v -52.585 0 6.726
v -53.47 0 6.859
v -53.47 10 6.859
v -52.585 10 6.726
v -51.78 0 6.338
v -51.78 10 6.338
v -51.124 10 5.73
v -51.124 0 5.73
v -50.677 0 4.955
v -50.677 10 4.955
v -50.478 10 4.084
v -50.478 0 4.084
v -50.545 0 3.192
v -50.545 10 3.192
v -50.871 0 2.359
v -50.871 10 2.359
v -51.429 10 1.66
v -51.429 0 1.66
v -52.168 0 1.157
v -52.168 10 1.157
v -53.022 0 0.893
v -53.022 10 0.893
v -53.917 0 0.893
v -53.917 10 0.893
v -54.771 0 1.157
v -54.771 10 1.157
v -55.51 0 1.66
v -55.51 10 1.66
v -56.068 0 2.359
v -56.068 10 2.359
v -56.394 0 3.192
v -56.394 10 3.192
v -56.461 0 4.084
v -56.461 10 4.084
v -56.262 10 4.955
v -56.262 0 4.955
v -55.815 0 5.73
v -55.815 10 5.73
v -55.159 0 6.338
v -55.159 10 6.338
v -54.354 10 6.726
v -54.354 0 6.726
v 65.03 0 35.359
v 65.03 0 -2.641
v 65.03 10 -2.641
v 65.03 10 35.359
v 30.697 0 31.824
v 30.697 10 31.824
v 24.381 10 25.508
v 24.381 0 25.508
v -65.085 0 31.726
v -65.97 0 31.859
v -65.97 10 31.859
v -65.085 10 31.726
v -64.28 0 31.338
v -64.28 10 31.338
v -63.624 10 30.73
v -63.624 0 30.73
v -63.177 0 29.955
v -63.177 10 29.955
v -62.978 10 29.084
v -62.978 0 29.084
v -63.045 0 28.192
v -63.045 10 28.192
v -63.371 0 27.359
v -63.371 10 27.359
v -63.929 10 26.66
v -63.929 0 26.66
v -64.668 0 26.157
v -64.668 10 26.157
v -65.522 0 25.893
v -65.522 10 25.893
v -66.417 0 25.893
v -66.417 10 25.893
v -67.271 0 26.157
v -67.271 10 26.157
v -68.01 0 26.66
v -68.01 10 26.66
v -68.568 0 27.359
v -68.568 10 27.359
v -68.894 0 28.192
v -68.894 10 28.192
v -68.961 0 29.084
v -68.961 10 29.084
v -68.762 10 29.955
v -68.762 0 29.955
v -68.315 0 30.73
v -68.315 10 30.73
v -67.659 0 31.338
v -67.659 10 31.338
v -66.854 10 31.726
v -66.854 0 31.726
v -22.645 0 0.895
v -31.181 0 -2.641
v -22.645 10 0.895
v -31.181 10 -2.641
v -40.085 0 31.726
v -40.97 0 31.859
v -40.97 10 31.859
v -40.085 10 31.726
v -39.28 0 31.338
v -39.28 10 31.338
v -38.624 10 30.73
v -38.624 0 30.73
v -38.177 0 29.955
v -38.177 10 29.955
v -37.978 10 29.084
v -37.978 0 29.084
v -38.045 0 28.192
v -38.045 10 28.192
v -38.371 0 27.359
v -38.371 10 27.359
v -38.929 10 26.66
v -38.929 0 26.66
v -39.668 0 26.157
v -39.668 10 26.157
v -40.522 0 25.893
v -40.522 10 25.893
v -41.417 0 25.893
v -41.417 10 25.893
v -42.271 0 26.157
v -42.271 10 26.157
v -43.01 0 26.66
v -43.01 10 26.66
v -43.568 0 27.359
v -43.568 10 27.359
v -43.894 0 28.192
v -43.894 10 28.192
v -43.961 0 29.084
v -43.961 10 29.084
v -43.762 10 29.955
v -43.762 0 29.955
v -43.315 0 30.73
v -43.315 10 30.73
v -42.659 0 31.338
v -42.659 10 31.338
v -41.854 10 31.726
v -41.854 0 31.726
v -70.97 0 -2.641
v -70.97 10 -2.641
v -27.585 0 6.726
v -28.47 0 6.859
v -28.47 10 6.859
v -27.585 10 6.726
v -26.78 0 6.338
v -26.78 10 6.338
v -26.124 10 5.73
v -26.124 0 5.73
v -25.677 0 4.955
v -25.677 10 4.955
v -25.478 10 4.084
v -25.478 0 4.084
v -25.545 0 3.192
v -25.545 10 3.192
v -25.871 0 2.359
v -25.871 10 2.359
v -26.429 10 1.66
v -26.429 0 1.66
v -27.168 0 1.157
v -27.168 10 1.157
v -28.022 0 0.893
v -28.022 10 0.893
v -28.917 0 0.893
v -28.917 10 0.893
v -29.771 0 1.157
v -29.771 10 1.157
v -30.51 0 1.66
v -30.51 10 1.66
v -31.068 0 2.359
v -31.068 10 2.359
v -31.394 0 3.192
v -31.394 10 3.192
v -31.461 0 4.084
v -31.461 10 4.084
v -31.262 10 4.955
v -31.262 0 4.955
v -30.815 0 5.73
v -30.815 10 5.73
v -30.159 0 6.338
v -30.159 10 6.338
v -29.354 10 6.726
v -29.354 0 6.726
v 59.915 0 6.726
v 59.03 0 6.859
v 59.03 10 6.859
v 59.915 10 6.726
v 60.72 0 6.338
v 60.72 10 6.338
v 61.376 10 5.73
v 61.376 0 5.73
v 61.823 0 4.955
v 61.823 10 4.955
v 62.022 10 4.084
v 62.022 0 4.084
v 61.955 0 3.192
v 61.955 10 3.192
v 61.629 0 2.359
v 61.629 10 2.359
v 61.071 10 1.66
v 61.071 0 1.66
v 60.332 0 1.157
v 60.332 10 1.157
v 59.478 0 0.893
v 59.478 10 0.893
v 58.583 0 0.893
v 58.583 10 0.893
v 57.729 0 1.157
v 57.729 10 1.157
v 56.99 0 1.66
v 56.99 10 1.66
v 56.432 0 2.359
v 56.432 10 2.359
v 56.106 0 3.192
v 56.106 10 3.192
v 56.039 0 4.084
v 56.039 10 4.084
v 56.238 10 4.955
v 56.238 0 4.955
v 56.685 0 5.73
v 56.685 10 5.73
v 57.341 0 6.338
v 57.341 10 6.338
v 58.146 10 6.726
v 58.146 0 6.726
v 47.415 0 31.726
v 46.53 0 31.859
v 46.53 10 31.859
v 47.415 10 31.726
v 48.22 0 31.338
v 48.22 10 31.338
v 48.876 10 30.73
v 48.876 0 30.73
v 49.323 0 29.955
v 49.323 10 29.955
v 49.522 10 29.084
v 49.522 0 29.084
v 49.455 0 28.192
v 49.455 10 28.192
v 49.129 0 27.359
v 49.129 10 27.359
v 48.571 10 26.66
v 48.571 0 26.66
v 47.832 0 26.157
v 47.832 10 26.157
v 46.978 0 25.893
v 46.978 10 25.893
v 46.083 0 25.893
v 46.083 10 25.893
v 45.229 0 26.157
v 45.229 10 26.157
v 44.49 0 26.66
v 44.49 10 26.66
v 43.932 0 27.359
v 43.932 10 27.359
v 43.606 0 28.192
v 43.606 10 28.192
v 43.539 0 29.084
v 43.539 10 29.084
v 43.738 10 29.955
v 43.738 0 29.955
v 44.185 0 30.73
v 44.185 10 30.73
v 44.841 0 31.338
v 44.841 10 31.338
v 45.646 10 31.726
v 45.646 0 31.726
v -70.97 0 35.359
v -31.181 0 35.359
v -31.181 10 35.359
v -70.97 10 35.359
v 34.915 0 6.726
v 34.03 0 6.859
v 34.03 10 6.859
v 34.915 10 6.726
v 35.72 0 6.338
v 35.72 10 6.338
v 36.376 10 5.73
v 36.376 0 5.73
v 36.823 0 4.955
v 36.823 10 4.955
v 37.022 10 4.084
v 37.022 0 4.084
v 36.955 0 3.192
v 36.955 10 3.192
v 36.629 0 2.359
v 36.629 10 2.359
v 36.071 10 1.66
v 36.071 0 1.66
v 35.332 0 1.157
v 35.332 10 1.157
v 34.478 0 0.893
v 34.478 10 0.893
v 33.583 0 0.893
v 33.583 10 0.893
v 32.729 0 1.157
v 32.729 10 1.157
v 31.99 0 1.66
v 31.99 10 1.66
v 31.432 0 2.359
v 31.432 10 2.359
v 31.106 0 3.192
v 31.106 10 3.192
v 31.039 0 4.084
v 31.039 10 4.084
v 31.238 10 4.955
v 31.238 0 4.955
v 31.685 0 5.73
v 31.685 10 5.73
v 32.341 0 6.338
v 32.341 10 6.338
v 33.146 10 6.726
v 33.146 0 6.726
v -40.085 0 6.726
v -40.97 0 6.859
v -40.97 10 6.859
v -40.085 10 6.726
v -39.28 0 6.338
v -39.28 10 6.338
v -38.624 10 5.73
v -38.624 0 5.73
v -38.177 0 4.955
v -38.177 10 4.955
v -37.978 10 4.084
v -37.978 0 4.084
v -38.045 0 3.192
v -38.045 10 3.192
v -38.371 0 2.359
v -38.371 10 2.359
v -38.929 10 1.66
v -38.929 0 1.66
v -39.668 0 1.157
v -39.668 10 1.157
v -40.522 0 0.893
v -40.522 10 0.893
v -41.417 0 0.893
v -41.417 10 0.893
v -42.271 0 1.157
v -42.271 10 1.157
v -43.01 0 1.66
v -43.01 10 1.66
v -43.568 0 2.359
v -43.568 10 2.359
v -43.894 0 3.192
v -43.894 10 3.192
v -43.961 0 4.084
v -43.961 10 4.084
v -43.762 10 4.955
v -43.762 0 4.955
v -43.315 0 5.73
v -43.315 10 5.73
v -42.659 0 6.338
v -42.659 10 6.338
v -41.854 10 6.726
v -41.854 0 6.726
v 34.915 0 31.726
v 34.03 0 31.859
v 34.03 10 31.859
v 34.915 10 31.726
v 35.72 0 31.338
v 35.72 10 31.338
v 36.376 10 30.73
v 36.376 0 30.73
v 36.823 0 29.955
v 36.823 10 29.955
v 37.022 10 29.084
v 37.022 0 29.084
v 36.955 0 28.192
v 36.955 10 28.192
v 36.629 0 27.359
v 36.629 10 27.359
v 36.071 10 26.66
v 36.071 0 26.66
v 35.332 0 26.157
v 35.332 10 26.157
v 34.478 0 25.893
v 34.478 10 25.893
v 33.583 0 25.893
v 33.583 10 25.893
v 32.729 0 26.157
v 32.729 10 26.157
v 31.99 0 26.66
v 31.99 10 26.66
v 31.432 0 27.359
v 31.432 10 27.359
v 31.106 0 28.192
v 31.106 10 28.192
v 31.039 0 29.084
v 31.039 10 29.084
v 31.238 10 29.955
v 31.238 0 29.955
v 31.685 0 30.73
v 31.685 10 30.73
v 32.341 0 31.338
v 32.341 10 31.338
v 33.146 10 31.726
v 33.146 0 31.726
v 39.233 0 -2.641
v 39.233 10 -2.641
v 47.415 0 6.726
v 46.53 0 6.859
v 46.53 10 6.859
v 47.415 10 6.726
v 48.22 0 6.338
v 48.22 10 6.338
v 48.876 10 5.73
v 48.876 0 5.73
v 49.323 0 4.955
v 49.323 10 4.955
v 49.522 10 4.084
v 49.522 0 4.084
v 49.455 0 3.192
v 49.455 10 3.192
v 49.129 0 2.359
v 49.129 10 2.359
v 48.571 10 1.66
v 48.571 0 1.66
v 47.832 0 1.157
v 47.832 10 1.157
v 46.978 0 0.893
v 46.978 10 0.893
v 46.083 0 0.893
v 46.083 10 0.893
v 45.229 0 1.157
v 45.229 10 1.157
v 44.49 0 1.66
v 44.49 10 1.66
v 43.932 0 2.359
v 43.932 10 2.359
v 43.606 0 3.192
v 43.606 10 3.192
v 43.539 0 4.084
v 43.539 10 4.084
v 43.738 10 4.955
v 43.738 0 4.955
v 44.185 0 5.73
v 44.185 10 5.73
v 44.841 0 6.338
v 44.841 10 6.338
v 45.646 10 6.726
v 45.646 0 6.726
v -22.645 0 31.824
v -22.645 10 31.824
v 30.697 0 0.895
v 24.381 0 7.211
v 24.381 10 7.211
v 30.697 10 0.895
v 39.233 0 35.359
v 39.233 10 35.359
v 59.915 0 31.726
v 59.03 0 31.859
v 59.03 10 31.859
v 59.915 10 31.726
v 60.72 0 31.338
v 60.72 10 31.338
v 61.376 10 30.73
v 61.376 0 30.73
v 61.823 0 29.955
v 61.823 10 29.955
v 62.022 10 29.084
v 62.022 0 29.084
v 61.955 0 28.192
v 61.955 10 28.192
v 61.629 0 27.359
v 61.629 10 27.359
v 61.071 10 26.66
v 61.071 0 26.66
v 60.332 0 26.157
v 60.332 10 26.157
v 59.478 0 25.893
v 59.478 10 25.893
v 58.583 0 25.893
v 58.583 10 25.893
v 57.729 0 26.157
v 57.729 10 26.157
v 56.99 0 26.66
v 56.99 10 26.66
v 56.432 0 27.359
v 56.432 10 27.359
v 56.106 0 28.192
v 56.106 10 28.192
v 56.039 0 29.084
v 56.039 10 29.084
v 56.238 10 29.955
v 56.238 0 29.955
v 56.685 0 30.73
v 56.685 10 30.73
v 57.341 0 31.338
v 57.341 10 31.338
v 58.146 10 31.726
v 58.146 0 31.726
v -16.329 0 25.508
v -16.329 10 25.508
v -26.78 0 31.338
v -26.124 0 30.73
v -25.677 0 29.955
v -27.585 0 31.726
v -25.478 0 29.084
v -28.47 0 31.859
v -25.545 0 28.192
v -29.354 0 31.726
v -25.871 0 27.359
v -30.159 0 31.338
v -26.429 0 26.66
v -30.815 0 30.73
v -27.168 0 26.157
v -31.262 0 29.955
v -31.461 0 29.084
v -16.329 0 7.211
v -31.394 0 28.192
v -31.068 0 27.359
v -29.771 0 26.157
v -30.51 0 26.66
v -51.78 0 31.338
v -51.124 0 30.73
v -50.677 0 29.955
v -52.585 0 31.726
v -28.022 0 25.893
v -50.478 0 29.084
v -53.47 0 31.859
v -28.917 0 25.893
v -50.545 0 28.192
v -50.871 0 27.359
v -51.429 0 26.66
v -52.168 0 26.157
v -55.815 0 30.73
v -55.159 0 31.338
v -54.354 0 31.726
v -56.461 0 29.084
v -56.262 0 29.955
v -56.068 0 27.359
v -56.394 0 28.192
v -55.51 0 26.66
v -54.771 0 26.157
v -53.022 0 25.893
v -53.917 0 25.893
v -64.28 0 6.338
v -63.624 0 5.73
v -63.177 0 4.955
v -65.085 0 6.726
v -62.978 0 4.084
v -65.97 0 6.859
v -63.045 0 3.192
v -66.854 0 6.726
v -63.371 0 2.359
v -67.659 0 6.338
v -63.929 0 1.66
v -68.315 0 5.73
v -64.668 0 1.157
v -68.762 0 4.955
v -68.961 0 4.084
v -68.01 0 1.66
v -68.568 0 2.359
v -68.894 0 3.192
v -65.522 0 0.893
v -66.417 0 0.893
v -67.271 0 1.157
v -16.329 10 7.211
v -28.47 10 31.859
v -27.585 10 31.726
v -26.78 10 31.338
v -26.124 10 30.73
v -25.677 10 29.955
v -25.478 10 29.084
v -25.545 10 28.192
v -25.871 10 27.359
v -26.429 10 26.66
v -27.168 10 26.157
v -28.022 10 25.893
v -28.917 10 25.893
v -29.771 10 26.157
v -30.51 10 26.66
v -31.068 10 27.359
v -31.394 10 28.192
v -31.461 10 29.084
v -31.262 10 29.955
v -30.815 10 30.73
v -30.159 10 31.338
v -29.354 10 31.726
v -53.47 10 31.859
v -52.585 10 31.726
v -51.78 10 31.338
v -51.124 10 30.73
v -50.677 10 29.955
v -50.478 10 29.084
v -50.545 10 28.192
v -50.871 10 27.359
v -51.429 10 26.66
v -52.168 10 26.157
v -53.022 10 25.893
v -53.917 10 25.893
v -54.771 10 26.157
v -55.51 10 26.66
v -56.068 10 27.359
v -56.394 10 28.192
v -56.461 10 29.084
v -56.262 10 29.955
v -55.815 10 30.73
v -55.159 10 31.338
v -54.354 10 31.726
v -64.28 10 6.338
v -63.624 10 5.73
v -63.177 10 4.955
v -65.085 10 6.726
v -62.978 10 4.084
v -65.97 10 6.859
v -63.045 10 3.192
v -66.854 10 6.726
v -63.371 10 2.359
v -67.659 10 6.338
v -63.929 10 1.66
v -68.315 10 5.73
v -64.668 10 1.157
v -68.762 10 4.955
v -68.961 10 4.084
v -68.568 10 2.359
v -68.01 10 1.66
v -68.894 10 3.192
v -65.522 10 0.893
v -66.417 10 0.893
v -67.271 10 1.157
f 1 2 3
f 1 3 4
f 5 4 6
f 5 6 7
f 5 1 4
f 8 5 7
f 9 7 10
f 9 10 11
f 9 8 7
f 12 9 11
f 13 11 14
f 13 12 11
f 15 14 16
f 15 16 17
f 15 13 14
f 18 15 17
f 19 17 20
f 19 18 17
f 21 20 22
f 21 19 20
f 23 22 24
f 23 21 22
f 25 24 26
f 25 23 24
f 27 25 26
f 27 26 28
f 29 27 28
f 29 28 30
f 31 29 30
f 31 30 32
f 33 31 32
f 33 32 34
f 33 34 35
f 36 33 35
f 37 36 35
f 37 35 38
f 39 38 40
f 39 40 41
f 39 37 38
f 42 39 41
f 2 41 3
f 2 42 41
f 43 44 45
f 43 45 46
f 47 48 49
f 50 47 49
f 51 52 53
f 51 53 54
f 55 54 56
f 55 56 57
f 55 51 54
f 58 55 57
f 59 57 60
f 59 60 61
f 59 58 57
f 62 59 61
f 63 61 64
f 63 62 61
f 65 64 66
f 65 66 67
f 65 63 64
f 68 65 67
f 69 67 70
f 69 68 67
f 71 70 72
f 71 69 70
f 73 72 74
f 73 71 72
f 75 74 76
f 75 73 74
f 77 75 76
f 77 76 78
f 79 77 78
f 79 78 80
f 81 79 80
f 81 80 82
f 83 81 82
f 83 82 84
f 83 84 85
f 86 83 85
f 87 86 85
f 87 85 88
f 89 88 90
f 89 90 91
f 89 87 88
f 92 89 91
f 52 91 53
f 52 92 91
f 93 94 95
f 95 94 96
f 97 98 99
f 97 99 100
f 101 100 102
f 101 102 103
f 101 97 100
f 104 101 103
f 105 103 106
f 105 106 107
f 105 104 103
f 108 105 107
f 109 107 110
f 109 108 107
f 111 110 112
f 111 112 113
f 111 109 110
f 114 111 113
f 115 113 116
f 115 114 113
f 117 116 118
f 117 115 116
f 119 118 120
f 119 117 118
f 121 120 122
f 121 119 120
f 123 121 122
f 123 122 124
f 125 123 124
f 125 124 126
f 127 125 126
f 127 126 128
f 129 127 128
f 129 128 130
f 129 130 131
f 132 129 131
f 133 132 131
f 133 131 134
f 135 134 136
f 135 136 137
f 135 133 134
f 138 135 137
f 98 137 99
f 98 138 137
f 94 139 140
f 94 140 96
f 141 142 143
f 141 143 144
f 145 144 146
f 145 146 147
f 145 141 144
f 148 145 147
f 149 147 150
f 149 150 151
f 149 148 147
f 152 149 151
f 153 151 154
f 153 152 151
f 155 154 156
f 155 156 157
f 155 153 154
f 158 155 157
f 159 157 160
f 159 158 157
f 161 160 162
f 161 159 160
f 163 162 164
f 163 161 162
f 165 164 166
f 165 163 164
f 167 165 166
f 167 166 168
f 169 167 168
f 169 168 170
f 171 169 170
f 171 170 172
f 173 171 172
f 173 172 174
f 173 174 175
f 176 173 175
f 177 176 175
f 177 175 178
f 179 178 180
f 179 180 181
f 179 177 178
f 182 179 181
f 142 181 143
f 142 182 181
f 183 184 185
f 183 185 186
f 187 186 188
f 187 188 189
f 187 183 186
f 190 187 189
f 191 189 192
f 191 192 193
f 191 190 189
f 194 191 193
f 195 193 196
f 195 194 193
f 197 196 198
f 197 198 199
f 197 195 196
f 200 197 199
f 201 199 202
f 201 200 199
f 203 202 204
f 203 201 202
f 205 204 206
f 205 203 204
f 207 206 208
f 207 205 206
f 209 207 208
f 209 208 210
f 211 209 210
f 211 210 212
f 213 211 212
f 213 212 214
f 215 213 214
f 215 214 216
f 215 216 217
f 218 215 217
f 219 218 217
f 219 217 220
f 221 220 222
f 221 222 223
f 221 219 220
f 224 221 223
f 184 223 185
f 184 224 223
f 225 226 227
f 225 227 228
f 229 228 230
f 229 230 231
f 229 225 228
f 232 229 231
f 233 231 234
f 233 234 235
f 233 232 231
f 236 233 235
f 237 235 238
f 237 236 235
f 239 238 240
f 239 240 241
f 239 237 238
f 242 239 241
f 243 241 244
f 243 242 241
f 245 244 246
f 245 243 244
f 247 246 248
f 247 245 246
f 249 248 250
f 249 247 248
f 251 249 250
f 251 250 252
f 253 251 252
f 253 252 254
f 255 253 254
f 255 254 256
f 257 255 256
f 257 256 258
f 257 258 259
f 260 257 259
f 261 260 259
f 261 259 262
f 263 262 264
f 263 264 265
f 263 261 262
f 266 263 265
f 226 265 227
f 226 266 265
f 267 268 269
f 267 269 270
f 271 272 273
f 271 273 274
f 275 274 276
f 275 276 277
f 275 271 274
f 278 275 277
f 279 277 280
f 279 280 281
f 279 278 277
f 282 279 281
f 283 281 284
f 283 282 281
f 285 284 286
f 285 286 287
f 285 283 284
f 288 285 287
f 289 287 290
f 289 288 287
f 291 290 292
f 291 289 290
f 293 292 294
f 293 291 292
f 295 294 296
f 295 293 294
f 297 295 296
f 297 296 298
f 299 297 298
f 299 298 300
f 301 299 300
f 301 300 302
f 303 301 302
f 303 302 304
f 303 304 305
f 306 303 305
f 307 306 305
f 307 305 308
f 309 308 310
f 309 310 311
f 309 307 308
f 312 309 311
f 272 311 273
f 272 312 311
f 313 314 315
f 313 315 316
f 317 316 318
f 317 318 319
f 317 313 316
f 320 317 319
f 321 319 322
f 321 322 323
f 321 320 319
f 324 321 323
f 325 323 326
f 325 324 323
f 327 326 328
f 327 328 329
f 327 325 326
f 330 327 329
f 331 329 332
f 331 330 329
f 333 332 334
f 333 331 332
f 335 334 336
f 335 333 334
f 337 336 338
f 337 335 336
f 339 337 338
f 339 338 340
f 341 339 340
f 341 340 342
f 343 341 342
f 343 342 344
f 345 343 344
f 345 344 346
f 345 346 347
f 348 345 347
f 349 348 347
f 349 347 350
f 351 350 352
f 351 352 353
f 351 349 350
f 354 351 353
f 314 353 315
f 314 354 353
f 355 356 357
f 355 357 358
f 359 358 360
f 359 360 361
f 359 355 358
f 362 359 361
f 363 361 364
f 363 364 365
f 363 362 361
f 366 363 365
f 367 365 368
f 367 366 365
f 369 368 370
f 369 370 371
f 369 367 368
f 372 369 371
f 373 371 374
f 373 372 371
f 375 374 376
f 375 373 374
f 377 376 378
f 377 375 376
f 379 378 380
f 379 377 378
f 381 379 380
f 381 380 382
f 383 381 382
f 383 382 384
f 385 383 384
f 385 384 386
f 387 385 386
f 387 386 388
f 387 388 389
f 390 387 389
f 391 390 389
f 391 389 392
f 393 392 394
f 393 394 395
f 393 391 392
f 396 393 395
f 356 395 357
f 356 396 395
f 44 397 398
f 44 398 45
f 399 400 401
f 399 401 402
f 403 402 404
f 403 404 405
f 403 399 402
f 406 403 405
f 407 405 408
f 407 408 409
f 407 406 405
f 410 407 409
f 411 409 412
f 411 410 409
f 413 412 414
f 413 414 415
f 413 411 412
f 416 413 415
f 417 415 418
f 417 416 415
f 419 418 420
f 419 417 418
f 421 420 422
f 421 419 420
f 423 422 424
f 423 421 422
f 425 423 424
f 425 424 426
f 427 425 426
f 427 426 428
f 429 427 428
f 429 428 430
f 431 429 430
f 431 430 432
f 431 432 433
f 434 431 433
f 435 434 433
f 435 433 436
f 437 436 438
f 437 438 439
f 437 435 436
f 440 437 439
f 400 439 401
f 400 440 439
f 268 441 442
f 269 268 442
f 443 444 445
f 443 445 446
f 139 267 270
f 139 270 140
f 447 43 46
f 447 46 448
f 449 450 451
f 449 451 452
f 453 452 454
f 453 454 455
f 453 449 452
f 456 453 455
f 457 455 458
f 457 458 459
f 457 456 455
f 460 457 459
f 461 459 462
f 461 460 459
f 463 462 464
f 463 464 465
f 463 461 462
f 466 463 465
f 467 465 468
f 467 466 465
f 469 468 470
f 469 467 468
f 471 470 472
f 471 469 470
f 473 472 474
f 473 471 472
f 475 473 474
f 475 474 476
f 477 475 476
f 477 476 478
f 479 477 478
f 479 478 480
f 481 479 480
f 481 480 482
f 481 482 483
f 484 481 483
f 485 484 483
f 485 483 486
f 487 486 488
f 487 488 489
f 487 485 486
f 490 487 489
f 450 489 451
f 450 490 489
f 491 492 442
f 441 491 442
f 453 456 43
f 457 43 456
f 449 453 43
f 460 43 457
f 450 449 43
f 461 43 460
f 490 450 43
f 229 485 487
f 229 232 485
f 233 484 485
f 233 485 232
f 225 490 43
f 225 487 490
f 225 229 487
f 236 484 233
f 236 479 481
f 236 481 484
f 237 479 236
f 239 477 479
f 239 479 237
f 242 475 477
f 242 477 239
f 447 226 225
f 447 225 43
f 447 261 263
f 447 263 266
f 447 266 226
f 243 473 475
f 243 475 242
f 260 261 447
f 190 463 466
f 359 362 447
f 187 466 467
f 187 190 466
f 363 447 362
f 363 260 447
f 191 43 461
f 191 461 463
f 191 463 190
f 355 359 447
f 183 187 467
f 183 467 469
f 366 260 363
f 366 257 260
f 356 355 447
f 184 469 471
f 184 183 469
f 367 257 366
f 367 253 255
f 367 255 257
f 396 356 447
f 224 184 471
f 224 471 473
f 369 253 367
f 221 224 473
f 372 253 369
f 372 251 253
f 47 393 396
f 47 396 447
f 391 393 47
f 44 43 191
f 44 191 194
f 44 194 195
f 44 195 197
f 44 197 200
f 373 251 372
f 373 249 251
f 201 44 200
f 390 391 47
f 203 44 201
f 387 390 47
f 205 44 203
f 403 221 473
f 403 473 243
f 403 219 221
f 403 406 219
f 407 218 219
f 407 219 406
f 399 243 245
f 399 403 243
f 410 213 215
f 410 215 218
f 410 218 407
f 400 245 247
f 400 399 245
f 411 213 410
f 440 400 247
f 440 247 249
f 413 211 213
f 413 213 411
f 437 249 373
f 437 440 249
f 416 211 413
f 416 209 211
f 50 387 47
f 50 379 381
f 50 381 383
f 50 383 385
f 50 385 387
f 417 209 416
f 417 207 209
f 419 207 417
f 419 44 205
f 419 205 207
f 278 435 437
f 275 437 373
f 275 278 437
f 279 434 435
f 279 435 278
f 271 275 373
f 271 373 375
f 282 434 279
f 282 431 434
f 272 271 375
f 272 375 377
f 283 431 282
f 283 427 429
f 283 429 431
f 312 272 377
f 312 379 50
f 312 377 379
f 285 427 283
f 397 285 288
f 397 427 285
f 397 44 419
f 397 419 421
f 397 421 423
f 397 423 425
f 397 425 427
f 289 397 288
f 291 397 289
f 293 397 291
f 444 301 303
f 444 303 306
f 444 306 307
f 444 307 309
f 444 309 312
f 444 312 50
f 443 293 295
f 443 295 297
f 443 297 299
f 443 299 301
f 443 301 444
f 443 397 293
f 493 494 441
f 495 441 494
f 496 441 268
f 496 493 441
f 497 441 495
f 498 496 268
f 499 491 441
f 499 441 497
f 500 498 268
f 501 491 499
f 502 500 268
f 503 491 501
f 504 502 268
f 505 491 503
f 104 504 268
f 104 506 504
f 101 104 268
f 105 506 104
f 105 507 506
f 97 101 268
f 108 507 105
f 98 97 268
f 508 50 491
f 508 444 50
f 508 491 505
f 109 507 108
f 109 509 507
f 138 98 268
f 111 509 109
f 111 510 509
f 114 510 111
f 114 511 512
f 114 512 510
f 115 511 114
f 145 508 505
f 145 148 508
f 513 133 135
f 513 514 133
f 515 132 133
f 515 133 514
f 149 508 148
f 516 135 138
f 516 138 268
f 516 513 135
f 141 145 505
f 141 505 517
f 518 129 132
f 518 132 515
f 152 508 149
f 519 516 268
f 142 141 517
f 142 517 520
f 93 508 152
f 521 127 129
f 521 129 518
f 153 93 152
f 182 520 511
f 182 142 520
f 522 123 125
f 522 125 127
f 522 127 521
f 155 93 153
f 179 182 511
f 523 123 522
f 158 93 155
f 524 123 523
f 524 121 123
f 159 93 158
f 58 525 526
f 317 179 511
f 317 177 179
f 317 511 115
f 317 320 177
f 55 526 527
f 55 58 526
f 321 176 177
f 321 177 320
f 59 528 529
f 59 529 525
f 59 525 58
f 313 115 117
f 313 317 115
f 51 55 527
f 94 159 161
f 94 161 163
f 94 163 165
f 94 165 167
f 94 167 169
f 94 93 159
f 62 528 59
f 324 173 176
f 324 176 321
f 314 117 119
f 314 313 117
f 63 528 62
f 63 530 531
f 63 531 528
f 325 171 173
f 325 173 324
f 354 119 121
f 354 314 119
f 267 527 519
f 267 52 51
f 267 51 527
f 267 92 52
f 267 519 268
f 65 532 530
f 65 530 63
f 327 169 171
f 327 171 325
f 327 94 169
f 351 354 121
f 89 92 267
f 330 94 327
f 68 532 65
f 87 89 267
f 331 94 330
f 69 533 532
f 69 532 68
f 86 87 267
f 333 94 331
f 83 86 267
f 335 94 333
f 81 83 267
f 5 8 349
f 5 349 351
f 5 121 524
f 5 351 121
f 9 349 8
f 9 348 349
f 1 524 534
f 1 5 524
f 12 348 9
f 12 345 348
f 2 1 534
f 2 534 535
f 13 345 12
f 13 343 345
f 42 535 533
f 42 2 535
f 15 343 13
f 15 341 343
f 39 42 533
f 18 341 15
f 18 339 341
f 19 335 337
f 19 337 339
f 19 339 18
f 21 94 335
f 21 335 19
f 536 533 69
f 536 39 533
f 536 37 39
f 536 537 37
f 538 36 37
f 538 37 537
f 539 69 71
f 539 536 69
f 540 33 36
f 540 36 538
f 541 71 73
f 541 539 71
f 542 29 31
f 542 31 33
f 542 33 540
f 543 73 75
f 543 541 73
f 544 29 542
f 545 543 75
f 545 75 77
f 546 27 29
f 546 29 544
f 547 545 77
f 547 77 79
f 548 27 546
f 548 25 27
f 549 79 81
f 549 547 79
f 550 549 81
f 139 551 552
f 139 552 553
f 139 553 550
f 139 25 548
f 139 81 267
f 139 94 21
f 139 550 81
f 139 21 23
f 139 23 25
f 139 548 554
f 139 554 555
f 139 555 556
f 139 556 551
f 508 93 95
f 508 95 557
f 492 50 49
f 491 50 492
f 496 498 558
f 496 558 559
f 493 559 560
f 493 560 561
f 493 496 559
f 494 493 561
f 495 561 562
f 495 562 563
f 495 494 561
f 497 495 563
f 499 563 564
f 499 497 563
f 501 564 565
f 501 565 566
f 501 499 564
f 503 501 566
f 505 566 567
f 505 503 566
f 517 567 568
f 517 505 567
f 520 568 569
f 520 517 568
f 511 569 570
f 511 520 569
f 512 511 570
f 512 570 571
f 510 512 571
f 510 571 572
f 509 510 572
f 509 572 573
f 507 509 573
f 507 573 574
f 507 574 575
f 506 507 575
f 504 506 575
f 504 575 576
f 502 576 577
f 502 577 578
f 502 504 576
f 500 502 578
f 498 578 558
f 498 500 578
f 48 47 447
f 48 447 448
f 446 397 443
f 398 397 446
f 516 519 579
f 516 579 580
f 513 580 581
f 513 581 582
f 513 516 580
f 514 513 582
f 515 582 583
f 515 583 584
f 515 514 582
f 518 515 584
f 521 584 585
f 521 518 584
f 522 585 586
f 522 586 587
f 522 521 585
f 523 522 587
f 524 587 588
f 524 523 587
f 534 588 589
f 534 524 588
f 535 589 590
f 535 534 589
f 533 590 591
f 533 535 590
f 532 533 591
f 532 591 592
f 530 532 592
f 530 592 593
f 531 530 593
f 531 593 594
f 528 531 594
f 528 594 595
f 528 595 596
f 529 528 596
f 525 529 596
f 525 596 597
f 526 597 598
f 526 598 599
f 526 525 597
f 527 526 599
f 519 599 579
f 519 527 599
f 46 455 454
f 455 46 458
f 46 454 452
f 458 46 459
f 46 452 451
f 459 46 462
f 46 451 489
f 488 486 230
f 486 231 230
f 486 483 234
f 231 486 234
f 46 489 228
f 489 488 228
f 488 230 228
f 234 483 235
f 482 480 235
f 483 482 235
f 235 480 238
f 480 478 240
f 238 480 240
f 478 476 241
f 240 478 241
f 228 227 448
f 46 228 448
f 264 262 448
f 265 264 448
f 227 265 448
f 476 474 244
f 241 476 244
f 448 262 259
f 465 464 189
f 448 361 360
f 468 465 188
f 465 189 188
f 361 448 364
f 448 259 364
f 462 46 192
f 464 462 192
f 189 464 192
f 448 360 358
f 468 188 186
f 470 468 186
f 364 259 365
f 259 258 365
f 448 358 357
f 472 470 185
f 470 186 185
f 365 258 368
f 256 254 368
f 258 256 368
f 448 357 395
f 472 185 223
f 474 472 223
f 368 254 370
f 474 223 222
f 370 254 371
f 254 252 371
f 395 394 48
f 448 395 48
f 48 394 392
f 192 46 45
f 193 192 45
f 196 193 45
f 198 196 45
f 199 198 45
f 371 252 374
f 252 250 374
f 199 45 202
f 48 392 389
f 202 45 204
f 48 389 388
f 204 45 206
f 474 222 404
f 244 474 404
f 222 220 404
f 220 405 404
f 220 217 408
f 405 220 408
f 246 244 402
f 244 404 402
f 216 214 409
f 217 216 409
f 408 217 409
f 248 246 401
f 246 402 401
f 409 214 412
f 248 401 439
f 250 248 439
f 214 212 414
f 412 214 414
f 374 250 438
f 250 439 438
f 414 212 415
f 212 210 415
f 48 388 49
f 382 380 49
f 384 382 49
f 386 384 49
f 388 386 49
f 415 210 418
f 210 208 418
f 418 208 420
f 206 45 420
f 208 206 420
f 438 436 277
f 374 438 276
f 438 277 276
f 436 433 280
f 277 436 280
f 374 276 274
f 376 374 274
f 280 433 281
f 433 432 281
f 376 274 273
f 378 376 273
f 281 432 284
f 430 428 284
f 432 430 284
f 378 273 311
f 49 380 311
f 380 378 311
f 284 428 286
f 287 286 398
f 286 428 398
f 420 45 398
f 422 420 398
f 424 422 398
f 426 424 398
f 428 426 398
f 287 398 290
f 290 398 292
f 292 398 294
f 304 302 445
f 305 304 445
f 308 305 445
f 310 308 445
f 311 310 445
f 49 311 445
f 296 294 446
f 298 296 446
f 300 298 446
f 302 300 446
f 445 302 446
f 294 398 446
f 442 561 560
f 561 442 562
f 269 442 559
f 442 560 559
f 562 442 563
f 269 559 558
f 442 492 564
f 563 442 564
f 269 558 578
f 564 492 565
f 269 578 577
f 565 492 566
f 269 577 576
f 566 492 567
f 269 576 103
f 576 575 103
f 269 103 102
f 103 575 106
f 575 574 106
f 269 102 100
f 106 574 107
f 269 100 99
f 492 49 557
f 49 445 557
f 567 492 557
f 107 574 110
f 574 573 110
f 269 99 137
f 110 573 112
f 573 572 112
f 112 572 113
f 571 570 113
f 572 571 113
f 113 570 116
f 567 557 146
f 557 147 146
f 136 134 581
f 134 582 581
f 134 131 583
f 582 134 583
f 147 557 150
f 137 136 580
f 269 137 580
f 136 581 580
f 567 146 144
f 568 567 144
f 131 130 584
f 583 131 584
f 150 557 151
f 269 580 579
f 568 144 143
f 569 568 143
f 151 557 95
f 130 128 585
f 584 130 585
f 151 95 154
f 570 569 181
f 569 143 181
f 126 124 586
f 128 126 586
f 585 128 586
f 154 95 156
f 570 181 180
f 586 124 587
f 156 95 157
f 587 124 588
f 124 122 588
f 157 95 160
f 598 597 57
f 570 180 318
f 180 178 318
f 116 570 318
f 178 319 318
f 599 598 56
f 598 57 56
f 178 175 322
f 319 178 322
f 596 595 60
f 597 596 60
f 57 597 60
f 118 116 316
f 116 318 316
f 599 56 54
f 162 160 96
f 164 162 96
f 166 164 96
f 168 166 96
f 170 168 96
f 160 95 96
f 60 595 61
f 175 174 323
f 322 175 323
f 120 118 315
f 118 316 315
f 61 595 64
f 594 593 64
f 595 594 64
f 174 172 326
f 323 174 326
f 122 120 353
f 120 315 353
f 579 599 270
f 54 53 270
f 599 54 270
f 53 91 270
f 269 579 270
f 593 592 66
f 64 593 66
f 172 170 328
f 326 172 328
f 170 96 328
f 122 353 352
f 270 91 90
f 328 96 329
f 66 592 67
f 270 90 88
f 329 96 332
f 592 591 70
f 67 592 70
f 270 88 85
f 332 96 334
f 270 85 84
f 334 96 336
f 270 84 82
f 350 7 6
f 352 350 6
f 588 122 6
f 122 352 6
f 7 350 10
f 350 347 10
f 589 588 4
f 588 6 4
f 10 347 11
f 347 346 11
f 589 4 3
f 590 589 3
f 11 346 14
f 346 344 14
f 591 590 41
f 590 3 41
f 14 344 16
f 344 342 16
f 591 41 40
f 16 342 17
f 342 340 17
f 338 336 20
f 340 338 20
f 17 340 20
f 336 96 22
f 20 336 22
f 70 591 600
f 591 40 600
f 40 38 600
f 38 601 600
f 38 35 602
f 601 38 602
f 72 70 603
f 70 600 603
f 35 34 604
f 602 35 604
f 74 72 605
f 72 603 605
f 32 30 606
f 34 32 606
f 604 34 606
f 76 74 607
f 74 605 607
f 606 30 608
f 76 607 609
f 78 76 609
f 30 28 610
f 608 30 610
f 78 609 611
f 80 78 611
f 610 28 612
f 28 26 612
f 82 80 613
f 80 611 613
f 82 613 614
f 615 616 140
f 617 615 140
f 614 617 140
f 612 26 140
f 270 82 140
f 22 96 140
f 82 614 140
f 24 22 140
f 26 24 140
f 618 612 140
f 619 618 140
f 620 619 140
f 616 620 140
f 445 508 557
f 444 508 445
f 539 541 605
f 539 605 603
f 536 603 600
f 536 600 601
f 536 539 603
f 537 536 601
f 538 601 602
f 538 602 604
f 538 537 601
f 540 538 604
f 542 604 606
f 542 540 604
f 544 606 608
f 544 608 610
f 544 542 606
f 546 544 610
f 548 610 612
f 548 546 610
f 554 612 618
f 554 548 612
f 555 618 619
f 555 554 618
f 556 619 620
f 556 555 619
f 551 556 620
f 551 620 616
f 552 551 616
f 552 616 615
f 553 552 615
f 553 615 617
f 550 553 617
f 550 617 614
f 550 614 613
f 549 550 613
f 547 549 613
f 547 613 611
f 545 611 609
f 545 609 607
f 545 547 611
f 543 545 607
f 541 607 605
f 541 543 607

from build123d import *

# Parameters (mm, degrees)
SKETCH1_R           = 3
BOSS_EXTRUDE1_DEPTH = 10
CHAMFER1_SIZE       = 5


with BuildPart() as part:
    # Sketch1 → Boss-Extrude1 (new body)
    with BuildSketch(Plane(origin=(0, 0, 0), x_dir=(1, 0, 0), z_dir=(0, 1, 0))):
        Polygon((-26.18056889, 2.640536741), (-16.329229088, -7.210803061), (24.381205478, -7.210803061), (34.23254528, 2.640536741), (65.030497816, 2.640536741), (65.030497816, -35.359463259), (34.23254528, -35.359463259), (24.381205478, -25.508123456), (-16.329229088, -25.508123456), (-26.18056889, -35.359463259), (-70.969502184, -35.359463259), (-70.969502184, 2.640536741), align=None)
        with Locations(Location((-65.969502184, -3.859463259, 0), (0, 0, 270))):
            Circle(SKETCH1_R, mode=Mode.SUBTRACT)
        with Locations(Location((-40.969502184, -3.859463259, 0), (0, 0, 270))):
            Circle(SKETCH1_R, mode=Mode.SUBTRACT)
        with Locations(Location((-40.969502184, -28.859463259, 0), (0, 0, 270))):
            Circle(SKETCH1_R, mode=Mode.SUBTRACT)
        with Locations(Location((-65.969502184, -28.859463259, 0), (0, 0, 270))):
            Circle(SKETCH1_R, mode=Mode.SUBTRACT)
        with Locations(Location((-28.469502184, -28.859463259, 0), (0, 0, 270))):
            Circle(SKETCH1_R, mode=Mode.SUBTRACT)
        with Locations(Location((-53.469502184, -3.859463259, 0), (0, 0, 270))):
            Circle(SKETCH1_R, mode=Mode.SUBTRACT)
        with Locations(Location((-53.469502184, -28.859463259, 0), (0, 0, 270))):
            Circle(SKETCH1_R, mode=Mode.SUBTRACT)
        with Locations(Location((-28.469502184, -3.859463259, 0), (0, 0, 270))):
            Circle(SKETCH1_R, mode=Mode.SUBTRACT)
        with Locations(Location((34.030497816, -3.859463259, 0), (0, 0, 270))):
            Circle(SKETCH1_R, mode=Mode.SUBTRACT)
        with Locations(Location((59.030497816, -28.859463259, 0), (0, 0, 270))):
            Circle(SKETCH1_R, mode=Mode.SUBTRACT)
        with Locations(Location((59.030497816, -3.859463259, 0), (0, 0, 270))):
            Circle(SKETCH1_R, mode=Mode.SUBTRACT)
        with Locations(Location((34.030497816, -28.859463259, 0), (0, 0, 270))):
            Circle(SKETCH1_R, mode=Mode.SUBTRACT)
        with Locations(Location((46.530497816, -28.859463259, 0), (0, 0, 270))):
            Circle(SKETCH1_R, mode=Mode.SUBTRACT)
        with Locations(Location((46.530497816, -3.859463259, 0), (0, 0, 270))):
            Circle(SKETCH1_R, mode=Mode.SUBTRACT)
    extrude(amount=BOSS_EXTRUDE1_DEPTH)

    # Chamfer1
    chamfer1_edges = [part.edges().sort_by_distance(p)[0] for p in [
        (-26.18056889, 5, -2.640536741),
        (34.23254528, 5, -2.640536741),
        (34.23254528, 5, 35.359463259),
        (-26.18056889, 5, 35.359463259),
    ]]
    chamfer(chamfer1_edges, length=CHAMFER1_SIZE)


solid = part.part
